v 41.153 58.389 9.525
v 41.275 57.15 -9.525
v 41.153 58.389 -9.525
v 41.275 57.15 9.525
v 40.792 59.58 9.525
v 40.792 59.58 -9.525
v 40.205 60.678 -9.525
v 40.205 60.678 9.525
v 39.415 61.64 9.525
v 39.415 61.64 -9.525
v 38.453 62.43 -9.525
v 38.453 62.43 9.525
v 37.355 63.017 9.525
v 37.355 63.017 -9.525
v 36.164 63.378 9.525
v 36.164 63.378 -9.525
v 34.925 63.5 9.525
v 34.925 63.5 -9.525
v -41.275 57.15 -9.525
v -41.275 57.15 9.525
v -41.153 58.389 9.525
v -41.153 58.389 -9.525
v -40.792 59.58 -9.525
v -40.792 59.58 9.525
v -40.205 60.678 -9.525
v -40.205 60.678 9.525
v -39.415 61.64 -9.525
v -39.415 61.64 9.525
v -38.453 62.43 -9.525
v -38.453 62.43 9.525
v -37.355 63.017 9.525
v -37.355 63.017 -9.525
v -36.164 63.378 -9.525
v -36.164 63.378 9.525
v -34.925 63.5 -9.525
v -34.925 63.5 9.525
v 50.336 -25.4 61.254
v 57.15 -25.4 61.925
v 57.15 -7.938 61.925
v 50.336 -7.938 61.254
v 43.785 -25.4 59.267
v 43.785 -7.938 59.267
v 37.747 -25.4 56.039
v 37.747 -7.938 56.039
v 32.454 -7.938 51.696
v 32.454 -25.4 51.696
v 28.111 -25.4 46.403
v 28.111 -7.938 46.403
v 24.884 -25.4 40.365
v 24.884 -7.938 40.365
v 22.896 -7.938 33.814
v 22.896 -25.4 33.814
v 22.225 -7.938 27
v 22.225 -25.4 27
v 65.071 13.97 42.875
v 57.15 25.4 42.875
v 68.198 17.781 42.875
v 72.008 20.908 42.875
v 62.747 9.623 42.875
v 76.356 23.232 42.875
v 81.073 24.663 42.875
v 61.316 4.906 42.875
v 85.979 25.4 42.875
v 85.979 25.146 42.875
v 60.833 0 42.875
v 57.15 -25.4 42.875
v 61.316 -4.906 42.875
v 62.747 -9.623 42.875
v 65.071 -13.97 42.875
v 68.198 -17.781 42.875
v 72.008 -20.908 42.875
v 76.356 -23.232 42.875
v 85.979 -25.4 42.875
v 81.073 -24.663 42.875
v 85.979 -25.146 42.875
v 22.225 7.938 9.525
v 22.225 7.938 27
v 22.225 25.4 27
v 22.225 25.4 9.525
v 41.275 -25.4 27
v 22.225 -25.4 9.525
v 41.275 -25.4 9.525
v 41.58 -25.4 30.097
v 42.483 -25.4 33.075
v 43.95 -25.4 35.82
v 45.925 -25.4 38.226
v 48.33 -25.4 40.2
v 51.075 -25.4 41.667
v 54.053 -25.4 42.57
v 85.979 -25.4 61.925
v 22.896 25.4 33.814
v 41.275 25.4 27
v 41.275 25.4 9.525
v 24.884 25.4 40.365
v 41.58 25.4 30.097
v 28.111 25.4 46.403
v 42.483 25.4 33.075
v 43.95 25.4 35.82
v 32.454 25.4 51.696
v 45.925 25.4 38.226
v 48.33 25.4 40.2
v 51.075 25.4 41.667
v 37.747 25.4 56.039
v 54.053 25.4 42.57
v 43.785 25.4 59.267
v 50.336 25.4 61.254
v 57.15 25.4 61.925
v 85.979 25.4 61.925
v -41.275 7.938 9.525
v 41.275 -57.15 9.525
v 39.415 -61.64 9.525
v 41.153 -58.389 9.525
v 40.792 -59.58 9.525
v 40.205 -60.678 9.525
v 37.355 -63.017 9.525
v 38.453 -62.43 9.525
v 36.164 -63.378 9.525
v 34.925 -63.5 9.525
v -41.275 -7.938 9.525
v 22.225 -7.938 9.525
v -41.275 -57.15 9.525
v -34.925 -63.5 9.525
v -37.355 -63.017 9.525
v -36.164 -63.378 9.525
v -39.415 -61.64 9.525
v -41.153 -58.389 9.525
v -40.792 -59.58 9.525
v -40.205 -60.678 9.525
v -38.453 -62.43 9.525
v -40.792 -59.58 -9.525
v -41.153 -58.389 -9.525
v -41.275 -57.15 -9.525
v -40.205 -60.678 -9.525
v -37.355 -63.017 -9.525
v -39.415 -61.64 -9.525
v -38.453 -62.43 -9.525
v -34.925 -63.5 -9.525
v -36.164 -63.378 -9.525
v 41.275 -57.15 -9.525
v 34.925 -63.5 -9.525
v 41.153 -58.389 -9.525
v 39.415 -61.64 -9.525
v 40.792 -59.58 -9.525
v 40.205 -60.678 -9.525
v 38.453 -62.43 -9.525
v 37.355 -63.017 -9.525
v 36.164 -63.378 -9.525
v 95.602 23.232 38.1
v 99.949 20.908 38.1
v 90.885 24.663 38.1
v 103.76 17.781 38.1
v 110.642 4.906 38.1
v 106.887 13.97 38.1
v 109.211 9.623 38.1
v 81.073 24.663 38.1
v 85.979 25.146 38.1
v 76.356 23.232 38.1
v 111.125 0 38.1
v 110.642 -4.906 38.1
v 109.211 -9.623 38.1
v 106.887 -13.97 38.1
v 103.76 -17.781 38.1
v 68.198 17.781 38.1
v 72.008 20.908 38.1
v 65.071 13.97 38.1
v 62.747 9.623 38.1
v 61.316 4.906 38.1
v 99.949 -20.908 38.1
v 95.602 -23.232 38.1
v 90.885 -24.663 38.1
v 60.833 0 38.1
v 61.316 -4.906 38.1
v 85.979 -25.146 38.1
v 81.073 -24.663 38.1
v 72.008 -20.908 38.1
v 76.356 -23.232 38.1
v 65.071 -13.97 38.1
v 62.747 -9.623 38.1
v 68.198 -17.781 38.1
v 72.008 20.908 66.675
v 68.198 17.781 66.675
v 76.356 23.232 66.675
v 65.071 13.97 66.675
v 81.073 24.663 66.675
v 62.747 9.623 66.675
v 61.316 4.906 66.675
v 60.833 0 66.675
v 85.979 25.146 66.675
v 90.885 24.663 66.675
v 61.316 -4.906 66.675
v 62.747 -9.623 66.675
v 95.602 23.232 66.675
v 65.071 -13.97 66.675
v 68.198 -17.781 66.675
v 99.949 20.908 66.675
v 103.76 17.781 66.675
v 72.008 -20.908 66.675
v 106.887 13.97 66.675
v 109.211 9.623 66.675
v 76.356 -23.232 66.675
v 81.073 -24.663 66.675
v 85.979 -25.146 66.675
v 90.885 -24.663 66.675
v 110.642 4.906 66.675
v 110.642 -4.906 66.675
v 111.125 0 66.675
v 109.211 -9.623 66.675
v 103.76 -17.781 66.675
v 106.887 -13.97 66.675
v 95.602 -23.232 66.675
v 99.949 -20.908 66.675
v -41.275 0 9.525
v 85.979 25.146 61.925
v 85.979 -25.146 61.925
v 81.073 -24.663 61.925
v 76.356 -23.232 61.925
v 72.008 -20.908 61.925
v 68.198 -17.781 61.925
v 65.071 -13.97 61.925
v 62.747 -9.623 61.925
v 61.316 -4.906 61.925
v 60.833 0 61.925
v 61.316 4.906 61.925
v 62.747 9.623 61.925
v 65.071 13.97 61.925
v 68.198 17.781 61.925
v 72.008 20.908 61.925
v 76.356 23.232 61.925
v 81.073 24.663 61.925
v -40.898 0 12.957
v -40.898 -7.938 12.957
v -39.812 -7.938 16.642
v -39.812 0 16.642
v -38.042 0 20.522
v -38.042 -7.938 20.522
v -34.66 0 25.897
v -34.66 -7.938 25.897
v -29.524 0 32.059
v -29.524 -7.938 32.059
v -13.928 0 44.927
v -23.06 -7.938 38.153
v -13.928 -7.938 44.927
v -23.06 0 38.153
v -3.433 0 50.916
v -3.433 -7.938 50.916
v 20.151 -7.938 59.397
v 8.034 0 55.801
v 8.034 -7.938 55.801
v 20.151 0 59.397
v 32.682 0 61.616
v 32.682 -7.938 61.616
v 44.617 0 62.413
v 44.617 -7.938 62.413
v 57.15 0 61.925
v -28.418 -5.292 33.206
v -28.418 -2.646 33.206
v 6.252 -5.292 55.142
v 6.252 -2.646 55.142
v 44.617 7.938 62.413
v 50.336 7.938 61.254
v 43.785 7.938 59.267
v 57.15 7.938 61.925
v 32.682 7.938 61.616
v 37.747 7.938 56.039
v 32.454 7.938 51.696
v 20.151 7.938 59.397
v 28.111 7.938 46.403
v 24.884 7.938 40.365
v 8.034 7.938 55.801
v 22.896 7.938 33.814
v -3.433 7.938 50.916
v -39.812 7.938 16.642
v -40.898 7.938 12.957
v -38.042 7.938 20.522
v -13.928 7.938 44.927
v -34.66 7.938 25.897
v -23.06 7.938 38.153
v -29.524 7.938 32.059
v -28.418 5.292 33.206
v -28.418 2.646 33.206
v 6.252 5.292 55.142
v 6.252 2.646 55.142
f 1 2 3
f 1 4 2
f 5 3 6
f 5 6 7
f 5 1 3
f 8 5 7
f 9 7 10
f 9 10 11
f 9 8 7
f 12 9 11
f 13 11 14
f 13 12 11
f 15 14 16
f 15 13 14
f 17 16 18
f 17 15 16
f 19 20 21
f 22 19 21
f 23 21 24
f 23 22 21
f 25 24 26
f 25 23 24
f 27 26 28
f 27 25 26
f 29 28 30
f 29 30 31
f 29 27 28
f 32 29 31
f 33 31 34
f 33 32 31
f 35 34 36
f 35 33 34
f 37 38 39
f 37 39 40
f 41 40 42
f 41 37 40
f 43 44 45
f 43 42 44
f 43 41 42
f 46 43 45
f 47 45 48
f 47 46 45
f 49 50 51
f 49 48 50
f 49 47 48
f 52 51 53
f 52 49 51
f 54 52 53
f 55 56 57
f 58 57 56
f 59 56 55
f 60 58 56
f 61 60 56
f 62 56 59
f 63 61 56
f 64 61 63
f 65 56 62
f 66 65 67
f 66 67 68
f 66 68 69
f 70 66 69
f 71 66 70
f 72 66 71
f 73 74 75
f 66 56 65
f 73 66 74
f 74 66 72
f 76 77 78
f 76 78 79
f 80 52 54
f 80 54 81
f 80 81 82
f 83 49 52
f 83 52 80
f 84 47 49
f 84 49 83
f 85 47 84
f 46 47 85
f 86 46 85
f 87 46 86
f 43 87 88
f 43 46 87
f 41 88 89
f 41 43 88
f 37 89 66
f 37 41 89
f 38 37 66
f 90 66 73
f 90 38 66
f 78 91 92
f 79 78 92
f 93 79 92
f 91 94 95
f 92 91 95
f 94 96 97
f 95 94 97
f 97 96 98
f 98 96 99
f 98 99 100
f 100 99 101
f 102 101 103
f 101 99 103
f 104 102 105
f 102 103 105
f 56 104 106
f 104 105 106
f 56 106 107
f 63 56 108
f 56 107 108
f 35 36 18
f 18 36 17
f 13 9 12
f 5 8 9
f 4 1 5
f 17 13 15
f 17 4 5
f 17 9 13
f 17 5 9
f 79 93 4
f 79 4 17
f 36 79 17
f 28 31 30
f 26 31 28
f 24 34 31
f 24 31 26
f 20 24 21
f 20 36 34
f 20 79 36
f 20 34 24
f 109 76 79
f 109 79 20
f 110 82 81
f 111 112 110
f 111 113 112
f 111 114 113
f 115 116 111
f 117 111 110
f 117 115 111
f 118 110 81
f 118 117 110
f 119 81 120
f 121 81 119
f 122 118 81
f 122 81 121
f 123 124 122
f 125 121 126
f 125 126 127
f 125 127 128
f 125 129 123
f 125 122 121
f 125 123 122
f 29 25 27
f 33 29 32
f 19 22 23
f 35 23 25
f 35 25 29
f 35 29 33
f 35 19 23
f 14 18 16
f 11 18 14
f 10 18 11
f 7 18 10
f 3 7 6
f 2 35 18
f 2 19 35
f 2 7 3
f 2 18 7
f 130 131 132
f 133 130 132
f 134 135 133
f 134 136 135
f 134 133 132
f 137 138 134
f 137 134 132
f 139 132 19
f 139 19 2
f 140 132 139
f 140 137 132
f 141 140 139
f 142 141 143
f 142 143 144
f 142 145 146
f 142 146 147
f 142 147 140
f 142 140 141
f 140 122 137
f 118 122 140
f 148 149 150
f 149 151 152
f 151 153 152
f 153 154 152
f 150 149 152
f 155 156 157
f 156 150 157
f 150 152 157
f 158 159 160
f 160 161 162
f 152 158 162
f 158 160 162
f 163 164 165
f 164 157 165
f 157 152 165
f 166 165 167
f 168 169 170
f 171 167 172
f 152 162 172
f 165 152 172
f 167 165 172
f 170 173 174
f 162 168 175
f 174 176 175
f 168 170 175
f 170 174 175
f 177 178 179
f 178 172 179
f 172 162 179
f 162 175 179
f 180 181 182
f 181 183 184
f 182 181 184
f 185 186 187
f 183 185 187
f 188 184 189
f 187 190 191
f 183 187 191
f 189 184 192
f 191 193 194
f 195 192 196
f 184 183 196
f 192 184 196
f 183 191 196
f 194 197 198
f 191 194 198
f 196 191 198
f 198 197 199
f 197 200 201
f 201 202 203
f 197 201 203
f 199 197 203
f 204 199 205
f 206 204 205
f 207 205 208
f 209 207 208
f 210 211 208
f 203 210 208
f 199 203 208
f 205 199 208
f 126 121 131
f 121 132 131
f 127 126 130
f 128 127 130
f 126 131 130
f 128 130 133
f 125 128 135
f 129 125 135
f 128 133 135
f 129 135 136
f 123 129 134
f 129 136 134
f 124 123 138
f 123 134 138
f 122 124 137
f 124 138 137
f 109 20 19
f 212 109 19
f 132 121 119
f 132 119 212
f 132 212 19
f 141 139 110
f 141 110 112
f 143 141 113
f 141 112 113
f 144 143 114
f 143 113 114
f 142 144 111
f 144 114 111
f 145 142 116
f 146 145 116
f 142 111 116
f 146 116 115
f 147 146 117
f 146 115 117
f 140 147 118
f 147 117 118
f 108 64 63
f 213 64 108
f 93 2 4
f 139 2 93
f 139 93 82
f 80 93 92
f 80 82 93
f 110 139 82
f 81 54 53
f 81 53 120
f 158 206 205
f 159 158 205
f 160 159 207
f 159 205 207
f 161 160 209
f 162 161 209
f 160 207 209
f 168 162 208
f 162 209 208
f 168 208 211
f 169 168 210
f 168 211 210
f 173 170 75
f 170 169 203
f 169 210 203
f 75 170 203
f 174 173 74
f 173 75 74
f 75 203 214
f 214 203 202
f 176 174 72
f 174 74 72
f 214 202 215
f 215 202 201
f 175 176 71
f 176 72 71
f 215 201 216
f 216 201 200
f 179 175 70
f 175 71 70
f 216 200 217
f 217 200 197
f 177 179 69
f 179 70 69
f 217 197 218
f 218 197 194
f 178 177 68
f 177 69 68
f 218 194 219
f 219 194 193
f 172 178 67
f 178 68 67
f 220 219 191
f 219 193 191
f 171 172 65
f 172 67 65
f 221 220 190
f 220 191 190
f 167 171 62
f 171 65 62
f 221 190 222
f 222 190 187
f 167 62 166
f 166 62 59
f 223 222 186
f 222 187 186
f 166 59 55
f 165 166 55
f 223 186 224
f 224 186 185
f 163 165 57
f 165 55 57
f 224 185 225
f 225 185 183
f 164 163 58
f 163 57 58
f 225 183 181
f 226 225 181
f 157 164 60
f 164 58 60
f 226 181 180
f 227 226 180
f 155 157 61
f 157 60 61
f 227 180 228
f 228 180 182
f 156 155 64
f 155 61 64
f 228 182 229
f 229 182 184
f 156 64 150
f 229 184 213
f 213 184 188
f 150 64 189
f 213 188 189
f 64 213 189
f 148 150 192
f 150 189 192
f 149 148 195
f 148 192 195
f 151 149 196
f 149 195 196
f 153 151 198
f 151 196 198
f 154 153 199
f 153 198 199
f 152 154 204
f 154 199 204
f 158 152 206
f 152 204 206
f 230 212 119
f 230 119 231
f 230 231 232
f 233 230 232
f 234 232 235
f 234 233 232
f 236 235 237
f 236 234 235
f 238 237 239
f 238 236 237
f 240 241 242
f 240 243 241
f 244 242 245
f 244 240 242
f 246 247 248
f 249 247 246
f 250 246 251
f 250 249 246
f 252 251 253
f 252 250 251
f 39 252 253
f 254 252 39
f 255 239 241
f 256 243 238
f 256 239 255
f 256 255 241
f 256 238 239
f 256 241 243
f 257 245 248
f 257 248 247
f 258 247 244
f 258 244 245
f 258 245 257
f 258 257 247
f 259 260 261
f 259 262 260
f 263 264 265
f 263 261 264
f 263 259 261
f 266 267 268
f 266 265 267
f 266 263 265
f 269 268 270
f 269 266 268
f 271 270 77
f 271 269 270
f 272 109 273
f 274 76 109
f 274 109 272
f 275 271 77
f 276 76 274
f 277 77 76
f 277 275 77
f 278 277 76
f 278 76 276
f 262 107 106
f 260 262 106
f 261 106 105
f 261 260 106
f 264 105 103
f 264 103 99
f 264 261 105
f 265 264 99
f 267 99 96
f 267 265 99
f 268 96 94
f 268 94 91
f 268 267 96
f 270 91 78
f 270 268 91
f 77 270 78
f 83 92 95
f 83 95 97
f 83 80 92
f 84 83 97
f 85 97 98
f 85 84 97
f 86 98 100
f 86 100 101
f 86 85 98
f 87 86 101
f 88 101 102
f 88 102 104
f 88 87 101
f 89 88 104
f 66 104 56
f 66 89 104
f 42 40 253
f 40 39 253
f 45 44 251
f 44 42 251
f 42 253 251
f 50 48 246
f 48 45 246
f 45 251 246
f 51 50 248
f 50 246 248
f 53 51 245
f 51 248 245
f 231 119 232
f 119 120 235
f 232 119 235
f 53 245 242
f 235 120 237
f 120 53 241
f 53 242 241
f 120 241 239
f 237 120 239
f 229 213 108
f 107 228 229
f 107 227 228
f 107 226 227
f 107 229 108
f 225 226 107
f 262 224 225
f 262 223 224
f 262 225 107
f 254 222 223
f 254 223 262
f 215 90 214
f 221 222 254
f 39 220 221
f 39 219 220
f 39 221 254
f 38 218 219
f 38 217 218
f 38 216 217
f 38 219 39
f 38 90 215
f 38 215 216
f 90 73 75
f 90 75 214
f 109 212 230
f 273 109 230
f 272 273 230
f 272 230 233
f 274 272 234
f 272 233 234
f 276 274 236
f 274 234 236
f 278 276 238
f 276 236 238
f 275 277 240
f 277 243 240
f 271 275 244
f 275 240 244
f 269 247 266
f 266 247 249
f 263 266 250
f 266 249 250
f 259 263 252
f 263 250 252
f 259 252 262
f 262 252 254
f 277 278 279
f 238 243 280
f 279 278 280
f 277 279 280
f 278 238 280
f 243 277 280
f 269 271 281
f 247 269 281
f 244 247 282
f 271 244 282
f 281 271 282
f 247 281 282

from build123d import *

# Parameters (mm, degrees)
F1_DEPTH = 63.5
F0_W     = 25.6538060188
F0_H     = 19.05
F2_DEPTH = 25.4
F3_DEPTH = 7.9375
F5_R     = 6.35


with BuildPart() as f1:
    # F0 (on Front) → F1 (new body, symmetric)
    with BuildSketch(Plane.XZ):
        Polygon((22.225, 9.525), (-41.275, 9.525), (-41.275, -9.525), (41.275, -9.525), (41.275, 9.525), align=None)
    extrude(amount=F1_DEPTH, both=True)

    # F0 (on Front) → F2 (join, symmetric)
    with BuildSketch(Plane.XZ):
        with Locations((73.1519030094, 52.4002)):
            Rectangle(F0_W, F0_H)
        with BuildLine():
            Line((22.225, 27.0002), (22.225, 9.525))
            Line((22.225, 9.525), (41.275, 9.525))
            Line((41.275, 9.525), (41.275, 27.0002))
            ThreePointArc((41.275, 27.0002), (45.9246798487, 38.2255201513), (57.15, 42.8752))
            Line((57.15, 42.8752), (60.325, 42.8752))
            Line((60.325, 42.8752), (60.325, 61.9252))
            Line((60.325, 61.9252), (57.15, 61.9252))
            ThreePointArc((57.15, 61.9252), (32.4542956671, 51.6959043329), (22.225, 27.0002))
        make_face()
    extrude(amount=F2_DEPTH, both=True)

    # F0 (on Front) → F3 (join, symmetric)
    with BuildSketch(Plane.XZ):
        with BuildLine():
            add(Edge.make_bspline(
                [(-41.275, 9.525), (-41.1863140762, 29.6085979789), (0, 67.188732326), (57.15, 61.9252)],
                knots=[0, 0, 0, 0, 111.5045361635, 111.5045361635, 111.5045361635, 111.5045361635], degree=3))
            Line((-41.275, 9.525), (22.225, 9.525))
            Line((22.225, 9.525), (22.225, 27.0002))
            ThreePointArc((22.225, 27.0002), (32.4542956671, 51.6959043329), (57.15, 61.9252))
        make_face()
    extrude(amount=F3_DEPTH, both=True)

    # F0 (on Front) → F4 (revolve)
    with BuildSketch(Plane.XZ):
        Polygon((85.9788060188, 66.675), (85.9788060188, 61.9252), (85.9788060188, 42.8752), (85.9788060188, 38.1), (111.125, 38.1), (111.125, 66.675), align=None)
    revolve(axis=Axis((85.9788060188, 0, 54.7751), (0, 0, -1)))

    # F5
    f5_edges = [f1.edges().sort_by_distance(p)[0] for p in [
        (41.275, -63.5, 0),
        (-41.275, -63.5, 0),
        (41.275, 63.5, 0),
        (-41.275, 63.5, 0),
    ]]
    fillet(f5_edges, radius=F5_R)


solid = f1.part
